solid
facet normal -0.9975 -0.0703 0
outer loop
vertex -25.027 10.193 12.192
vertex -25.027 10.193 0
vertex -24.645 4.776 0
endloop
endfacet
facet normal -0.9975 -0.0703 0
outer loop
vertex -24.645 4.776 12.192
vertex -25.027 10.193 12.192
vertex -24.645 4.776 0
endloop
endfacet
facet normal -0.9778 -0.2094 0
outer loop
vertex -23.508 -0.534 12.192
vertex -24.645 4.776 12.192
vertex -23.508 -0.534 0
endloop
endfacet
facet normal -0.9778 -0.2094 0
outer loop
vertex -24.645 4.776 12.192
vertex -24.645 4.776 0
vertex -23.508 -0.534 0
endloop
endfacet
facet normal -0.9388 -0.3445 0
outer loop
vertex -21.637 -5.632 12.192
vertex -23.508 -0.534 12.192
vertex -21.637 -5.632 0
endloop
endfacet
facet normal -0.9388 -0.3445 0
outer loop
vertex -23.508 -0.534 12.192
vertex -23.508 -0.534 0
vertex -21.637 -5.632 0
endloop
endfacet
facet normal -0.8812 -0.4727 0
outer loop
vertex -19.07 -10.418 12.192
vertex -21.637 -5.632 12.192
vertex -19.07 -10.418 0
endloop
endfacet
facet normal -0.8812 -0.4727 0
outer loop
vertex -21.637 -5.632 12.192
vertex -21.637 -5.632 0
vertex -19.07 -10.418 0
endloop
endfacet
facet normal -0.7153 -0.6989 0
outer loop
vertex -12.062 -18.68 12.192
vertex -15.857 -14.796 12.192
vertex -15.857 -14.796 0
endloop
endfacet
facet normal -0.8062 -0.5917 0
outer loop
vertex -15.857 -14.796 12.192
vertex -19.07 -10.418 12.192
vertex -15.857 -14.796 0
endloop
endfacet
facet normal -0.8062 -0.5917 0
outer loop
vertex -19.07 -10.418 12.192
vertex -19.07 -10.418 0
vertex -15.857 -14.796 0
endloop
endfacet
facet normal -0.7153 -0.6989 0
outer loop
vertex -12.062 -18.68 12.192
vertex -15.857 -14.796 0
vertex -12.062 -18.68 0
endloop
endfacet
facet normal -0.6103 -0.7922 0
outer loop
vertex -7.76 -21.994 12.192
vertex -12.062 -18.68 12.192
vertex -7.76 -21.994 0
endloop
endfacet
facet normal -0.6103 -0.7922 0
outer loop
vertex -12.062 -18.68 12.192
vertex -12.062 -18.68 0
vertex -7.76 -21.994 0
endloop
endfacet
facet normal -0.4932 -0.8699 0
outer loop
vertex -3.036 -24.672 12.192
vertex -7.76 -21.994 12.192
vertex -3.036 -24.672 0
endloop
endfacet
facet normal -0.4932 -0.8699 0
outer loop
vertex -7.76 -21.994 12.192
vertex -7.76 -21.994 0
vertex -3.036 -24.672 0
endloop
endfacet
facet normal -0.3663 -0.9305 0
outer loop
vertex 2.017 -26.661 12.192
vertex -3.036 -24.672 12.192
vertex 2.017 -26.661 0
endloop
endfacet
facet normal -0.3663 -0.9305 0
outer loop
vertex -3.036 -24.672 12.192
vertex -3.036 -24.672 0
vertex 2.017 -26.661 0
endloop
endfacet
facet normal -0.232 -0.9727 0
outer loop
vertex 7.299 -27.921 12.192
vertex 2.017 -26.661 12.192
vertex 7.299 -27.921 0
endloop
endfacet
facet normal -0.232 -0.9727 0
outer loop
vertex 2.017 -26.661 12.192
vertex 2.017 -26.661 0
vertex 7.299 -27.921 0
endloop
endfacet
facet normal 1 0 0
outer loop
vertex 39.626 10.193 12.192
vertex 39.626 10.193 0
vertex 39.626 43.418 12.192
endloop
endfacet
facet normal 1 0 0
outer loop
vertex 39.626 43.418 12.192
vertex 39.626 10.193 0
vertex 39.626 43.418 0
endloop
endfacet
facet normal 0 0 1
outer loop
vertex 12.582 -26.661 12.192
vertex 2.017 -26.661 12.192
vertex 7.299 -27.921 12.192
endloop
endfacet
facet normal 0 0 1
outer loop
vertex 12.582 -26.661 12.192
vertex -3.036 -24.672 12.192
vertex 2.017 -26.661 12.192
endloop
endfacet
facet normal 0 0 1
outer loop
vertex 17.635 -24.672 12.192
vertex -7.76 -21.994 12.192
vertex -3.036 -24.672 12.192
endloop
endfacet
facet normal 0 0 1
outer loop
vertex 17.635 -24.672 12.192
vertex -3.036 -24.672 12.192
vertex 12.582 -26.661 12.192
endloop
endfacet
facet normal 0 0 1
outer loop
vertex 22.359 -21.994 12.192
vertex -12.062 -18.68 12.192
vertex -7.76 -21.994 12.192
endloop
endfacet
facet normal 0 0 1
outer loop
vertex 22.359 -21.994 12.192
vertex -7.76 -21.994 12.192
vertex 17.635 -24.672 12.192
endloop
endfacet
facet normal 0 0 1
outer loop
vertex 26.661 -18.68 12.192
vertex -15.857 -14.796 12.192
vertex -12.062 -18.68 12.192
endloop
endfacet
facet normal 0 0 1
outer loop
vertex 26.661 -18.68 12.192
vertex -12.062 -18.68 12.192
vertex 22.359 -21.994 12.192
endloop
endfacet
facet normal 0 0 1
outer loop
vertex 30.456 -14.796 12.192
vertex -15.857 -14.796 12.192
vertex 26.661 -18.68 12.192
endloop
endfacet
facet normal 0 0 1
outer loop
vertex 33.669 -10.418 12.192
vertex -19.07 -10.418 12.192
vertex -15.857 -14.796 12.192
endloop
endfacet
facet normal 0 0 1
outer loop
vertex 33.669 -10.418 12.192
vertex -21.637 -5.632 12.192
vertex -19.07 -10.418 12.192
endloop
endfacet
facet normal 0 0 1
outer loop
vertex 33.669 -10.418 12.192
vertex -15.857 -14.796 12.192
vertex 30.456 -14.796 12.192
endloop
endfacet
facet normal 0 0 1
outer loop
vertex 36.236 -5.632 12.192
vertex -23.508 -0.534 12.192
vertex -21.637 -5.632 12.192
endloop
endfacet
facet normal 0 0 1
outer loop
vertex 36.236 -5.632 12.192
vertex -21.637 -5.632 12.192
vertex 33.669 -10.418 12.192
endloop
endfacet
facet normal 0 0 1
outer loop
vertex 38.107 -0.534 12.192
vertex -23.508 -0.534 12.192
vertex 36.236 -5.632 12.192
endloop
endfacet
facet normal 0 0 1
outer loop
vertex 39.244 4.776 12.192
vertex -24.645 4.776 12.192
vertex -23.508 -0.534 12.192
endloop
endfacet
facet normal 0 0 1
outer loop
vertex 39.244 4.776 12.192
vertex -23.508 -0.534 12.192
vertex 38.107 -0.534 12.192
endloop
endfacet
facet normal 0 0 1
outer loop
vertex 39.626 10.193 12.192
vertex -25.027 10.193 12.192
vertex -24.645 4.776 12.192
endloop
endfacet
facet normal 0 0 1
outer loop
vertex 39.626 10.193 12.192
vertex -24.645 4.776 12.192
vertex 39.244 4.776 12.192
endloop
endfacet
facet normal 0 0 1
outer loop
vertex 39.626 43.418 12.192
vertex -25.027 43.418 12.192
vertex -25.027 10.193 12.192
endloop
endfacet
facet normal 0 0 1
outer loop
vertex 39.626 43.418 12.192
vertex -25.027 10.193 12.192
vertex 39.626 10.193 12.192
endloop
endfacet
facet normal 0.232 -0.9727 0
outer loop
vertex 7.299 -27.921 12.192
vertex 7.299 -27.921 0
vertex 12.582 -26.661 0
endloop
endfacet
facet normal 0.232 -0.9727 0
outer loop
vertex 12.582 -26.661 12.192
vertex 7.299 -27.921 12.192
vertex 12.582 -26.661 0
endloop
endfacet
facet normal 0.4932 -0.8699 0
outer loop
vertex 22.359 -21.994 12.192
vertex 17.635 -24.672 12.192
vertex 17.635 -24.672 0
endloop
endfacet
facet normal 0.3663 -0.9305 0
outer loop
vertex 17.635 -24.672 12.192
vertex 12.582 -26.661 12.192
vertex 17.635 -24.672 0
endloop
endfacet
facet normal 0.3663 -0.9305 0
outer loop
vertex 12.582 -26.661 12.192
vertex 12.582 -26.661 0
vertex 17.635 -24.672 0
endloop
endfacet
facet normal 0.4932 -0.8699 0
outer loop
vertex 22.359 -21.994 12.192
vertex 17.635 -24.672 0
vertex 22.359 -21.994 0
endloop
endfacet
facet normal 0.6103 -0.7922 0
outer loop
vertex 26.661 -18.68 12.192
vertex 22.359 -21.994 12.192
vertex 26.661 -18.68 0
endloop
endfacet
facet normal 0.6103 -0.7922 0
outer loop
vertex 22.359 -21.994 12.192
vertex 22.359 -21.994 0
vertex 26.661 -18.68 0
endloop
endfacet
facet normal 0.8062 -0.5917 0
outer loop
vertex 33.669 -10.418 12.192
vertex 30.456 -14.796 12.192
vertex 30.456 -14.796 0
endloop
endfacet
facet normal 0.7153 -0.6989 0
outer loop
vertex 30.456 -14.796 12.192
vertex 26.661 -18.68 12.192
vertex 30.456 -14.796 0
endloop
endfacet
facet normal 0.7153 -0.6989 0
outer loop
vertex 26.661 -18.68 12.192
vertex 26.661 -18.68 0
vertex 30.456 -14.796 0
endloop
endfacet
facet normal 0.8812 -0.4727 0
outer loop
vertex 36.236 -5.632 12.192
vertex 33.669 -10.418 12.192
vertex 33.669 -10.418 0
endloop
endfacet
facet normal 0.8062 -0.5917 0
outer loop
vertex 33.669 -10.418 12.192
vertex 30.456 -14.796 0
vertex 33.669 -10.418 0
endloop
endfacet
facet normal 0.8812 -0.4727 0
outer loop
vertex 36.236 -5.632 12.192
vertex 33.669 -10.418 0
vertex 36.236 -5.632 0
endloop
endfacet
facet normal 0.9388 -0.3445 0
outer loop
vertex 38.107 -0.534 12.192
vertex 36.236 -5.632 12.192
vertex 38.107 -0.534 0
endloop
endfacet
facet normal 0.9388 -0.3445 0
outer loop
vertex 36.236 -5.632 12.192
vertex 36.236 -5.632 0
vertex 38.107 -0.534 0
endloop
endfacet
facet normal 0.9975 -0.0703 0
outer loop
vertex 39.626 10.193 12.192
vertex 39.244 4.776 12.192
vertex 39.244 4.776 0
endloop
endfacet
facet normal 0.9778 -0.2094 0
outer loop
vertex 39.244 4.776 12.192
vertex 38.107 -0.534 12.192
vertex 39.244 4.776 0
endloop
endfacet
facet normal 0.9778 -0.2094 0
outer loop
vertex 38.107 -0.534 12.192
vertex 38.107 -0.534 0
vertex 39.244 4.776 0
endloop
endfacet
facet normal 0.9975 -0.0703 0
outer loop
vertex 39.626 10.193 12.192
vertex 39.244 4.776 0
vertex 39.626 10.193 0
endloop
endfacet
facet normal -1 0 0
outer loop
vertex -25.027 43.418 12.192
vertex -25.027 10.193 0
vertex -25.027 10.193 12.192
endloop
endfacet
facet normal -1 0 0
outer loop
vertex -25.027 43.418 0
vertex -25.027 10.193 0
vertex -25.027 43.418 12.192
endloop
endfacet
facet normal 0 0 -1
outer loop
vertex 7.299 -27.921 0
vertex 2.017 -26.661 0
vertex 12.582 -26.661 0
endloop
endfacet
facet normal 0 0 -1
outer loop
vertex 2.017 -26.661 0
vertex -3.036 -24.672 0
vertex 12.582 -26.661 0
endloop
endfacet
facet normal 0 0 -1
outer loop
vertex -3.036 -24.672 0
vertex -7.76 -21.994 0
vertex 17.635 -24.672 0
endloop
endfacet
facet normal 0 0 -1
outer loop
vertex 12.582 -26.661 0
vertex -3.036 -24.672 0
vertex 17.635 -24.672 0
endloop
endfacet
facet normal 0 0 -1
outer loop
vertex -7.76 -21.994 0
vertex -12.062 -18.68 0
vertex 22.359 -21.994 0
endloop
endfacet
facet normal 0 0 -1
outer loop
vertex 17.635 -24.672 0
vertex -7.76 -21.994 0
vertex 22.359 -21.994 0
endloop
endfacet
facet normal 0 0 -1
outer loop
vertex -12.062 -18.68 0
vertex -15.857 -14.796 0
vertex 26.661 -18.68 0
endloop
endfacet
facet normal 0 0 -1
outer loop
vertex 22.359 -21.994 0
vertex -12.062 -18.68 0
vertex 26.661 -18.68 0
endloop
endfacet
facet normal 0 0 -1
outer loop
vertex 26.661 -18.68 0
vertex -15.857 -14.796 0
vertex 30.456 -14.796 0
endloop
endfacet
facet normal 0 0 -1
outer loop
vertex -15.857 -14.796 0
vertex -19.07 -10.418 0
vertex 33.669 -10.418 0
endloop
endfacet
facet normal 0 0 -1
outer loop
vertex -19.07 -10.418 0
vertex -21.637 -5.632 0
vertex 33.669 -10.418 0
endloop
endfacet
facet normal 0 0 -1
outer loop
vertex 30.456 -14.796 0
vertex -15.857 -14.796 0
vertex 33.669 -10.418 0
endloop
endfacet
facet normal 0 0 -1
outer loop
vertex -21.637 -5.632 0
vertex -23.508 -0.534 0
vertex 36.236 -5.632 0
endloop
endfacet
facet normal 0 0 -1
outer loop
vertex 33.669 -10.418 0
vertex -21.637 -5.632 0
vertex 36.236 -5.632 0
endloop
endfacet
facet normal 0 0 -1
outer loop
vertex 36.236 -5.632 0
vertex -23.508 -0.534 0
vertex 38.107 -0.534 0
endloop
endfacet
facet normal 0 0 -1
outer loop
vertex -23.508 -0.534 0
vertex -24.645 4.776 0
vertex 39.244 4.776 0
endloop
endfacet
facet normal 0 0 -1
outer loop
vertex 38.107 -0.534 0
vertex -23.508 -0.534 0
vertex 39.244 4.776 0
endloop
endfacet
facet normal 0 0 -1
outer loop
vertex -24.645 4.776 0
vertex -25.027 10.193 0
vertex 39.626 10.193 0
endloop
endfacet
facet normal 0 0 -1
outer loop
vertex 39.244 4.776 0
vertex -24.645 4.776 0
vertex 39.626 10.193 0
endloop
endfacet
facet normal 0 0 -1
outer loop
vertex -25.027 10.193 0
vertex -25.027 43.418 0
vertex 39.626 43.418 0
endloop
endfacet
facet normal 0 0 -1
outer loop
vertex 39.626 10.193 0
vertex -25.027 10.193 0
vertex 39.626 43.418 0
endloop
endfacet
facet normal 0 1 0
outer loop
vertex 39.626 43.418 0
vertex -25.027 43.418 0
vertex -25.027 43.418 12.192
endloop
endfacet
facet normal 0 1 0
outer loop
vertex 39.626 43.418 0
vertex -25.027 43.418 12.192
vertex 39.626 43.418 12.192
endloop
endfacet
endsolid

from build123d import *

# Parameters (mm, degrees)
F0_W        = 64.6526291966
F0_H        = 71.8573257327
F1_DEPTH    = 12.192
F2_T1_DEPTH = 205.3532271255


# Not quite as in the source:
# - a fillet or chamfer that OpenCascade refuses, or shapes differently, is made with other operations: its cross-section is extruded or revolved along the edge and cut away or added


with BuildPart() as f1:
    # F0 (on Top) → F1 (new body)
    with BuildSketch(Plane.XY):
        with Locations((7.299490273, 7.4890889227)):
            Rectangle(F0_W, F0_H)
    extrude(amount=F1_DEPTH)

    # F2: fillet of radius 38.6322454251 on 2 edges, made by hand

    # F2_s2 → F2_t1 (cut)
    with BuildSketch(Plane.XY.offset(-96.5806135627)):
        with BuildLine():
            ThreePointArc((0.9935594462, -28.4395739436), (28.3106821588, -17.1244512311), (39.6258048713, 10.1926714815))
            Line((39.6258048713, 10.1926714815), (39.6258048713, -28.4395739436))
            Line((39.6258048713, -28.4395739436), (0.9935594462, -28.4395739436))
        make_face()
        with BuildLine():
            ThreePointArc((-25.0268243253, 10.1926714815), (-13.7117016128, -17.1244512311), (13.6054210998, -28.4395739436))
            Line((13.6054210998, -28.4395739436), (-25.0268243253, -28.4395739436))
            Line((-25.0268243253, -28.4395739436), (-25.0268243253, 10.1926714815))
        make_face()
    extrude(amount=F2_T1_DEPTH, mode=Mode.SUBTRACT)


solid = f1.part
